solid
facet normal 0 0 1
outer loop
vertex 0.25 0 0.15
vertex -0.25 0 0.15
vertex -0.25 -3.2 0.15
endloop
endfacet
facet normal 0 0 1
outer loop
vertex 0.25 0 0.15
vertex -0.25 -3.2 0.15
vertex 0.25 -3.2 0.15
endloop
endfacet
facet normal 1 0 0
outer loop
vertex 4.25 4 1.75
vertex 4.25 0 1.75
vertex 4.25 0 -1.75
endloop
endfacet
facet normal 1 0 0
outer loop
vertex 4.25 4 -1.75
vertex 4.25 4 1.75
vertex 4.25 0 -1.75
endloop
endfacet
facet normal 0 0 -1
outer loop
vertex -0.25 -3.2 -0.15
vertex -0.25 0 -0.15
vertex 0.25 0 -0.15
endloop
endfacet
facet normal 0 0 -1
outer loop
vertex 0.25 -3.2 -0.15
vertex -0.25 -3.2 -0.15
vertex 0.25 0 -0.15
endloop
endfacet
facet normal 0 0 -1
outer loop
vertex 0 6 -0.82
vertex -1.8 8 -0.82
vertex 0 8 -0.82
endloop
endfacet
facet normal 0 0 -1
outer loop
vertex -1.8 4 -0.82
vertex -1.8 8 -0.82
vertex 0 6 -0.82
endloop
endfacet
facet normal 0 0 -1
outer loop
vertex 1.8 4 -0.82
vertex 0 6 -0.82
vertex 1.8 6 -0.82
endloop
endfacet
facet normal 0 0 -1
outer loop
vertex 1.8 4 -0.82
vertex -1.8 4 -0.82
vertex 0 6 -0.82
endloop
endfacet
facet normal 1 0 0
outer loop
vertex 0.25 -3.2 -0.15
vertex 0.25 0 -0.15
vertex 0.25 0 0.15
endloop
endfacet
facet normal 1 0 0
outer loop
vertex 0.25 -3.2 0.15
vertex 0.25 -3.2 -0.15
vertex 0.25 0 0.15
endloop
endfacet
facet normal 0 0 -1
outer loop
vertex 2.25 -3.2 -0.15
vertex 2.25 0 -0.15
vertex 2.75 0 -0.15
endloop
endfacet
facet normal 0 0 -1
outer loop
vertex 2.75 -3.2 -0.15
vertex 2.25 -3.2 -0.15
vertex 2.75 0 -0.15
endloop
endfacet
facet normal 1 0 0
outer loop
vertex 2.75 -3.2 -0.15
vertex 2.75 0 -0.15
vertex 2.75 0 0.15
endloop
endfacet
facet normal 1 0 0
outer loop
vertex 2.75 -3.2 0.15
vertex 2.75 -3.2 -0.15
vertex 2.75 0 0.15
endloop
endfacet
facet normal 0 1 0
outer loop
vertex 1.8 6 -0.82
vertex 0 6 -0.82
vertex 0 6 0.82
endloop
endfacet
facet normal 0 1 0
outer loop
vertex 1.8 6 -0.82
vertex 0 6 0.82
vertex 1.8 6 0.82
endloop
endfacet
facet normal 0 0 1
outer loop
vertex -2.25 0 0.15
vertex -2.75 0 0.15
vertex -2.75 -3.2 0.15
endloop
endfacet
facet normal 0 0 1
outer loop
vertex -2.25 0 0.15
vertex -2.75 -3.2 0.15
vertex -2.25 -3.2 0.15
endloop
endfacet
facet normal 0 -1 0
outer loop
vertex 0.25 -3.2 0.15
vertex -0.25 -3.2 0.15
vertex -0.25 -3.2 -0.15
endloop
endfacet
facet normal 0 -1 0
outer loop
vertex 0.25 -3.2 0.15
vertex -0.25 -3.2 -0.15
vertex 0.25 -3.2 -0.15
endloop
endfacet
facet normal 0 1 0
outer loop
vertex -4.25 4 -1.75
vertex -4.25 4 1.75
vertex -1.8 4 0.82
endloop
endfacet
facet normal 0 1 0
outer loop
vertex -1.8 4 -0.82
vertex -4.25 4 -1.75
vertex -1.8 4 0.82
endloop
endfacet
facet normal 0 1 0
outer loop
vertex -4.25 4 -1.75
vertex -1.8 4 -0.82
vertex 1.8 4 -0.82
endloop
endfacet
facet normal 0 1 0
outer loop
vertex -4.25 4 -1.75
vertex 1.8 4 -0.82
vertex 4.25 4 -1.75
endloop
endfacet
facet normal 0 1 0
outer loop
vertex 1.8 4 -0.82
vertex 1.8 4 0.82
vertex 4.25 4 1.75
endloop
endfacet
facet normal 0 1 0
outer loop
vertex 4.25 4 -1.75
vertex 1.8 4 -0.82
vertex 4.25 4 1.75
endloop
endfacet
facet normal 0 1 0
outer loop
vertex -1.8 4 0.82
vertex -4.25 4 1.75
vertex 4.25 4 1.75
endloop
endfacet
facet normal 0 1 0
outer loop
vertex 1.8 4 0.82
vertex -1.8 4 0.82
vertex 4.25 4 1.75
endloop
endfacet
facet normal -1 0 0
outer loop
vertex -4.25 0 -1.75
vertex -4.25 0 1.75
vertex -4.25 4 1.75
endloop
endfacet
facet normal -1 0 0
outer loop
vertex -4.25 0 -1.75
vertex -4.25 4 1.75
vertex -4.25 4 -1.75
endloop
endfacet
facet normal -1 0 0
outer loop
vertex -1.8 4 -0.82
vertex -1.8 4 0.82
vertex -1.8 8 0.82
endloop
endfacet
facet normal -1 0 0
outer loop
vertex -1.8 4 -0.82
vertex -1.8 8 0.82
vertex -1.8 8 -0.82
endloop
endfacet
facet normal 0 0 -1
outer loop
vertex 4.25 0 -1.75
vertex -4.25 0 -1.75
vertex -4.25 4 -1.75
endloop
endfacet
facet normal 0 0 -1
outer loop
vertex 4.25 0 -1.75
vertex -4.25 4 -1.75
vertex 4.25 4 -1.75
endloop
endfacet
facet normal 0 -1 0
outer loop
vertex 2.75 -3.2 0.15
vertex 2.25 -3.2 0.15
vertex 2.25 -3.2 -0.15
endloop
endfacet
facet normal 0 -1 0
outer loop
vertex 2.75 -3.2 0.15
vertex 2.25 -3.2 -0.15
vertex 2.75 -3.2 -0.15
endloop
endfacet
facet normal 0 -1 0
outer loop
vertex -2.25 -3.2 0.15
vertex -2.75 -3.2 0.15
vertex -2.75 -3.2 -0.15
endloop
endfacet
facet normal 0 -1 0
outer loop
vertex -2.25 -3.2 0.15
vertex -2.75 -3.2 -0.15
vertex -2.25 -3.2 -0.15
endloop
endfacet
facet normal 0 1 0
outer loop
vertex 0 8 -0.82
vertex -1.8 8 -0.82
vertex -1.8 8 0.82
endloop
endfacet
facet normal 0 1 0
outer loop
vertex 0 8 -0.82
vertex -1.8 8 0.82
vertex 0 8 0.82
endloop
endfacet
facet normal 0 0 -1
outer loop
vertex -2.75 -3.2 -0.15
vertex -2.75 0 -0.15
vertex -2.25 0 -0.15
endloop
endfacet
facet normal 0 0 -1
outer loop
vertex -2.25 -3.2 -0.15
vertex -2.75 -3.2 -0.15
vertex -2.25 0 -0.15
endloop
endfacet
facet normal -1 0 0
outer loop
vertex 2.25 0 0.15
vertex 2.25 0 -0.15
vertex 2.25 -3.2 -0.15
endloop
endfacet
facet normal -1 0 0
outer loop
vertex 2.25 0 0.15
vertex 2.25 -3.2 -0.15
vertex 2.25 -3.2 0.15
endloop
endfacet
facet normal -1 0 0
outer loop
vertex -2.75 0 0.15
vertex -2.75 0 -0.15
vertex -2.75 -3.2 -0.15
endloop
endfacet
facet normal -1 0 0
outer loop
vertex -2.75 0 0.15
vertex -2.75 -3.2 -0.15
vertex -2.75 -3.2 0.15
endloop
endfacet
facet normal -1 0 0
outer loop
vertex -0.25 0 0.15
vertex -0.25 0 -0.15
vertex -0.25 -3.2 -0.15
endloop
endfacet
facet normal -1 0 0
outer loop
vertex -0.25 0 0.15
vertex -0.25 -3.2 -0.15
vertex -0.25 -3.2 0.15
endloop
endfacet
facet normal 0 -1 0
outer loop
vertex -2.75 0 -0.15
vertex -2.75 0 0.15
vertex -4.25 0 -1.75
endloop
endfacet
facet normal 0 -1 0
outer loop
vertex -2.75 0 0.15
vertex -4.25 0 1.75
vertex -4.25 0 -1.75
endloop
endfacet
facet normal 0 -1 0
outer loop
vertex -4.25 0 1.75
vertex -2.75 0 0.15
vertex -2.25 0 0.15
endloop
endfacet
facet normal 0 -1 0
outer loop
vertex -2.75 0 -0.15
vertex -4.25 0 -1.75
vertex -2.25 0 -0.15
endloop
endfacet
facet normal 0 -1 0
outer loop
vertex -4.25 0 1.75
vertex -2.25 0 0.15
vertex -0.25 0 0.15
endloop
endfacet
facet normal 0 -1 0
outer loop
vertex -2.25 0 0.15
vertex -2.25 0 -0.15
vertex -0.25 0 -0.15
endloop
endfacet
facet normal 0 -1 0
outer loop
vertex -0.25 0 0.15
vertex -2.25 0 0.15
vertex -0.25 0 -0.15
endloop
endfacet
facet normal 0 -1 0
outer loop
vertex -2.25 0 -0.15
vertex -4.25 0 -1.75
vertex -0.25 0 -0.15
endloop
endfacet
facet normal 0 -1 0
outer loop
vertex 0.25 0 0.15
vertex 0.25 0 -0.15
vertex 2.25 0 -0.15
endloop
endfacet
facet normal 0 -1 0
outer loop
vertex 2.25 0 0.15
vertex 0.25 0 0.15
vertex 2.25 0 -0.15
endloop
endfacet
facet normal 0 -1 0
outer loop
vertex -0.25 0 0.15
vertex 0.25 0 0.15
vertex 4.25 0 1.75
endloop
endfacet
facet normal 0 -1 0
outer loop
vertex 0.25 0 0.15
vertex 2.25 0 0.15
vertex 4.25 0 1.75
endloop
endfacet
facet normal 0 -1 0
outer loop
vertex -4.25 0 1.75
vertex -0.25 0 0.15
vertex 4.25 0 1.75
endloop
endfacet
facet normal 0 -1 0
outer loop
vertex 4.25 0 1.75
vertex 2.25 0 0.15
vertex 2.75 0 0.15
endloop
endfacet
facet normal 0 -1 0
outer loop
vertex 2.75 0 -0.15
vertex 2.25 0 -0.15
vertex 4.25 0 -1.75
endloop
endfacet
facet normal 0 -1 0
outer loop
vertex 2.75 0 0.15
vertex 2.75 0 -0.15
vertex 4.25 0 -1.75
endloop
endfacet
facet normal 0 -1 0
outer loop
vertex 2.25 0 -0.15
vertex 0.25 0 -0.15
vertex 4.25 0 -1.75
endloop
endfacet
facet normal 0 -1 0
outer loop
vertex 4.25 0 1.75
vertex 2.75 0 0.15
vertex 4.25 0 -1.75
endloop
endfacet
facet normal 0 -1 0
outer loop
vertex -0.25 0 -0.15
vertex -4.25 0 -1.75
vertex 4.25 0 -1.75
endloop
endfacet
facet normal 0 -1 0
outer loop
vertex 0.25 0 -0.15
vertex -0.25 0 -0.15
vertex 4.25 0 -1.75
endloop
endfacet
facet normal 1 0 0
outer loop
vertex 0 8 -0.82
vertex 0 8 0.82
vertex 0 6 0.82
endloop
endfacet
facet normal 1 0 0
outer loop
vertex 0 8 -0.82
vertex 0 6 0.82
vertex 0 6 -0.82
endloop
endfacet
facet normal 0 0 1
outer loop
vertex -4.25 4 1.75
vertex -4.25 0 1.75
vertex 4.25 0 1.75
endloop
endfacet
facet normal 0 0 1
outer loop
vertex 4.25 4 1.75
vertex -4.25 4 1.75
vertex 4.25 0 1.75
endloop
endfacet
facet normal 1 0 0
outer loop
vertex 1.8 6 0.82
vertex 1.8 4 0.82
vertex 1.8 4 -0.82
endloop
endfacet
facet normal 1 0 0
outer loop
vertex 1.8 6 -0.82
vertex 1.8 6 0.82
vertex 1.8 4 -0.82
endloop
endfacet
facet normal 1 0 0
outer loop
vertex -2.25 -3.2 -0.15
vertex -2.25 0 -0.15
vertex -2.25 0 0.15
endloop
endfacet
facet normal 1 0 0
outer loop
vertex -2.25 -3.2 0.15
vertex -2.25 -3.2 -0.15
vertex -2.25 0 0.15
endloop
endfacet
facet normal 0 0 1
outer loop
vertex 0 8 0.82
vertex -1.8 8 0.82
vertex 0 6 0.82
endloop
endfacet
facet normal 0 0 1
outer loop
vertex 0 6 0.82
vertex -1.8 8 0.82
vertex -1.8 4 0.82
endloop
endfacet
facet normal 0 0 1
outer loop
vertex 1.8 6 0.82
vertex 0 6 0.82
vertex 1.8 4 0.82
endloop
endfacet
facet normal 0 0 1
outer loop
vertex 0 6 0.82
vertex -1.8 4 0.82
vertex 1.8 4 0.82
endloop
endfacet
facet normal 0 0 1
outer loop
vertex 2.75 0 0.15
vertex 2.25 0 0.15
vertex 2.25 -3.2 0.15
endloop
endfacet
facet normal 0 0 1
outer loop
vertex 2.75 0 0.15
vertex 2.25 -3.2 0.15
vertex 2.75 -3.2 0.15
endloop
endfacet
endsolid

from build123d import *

# Parameters (mm, degrees)
SKETCH_1_W          = 8.5
SKETCH_1_H          = 3.5
EXTRUDE_1_DEPTH     = 4
SKETCH_2_W          = 3.6
SKETCH_2_H          = 1.64
EXTRUDE_2_DEPTH     = 4
SKETCH_3_W          = 1.8
SKETCH_3_H          = 1.64
CUT_EXTRUDE_1_DEPTH = 2
EXTRUDE_START       = -4
SKETCH_4_W          = 0.5
SKETCH_4_H          = 0.3
EXTRUDE_3_DEPTH     = 7.2


with BuildPart() as part:
    # 草图1 → 凸台-拉伸1 (new body)
    with BuildSketch(Plane(origin=(0, 0, 0), x_dir=(1, 0, 0), z_dir=(0, 1, 0))):
        Rectangle(SKETCH_1_W, SKETCH_1_H)
    extrude(amount=EXTRUDE_1_DEPTH)

    # 草图2 → 凸台-拉伸2 (add)
    with BuildSketch(Plane(origin=(0, 4, 0), x_dir=(1, 0, 0), z_dir=(0, 1, 0))):
        Rectangle(SKETCH_2_W, SKETCH_2_H)
    extrude(amount=EXTRUDE_2_DEPTH)

    # 草图3 → 切除-拉伸1 (cut)
    with BuildSketch(Plane(origin=(0, 8, 0), x_dir=(1, 0, 0), z_dir=(0, 1, 0))):
        with Locations((0.9, 0)):
            Rectangle(SKETCH_3_W, SKETCH_3_H)
    extrude(amount=-CUT_EXTRUDE_1_DEPTH, mode=Mode.SUBTRACT)

    # 草图4 → 凸台-拉伸3 (add)
    with BuildSketch(Plane.XZ.offset(EXTRUDE_START)):
        with Locations((2.5, 0)):
            Rectangle(SKETCH_4_W, SKETCH_4_H)
        Rectangle(SKETCH_4_W, SKETCH_4_H)
        with Locations((-2.5, 0)):
            Rectangle(SKETCH_4_W, SKETCH_4_H)
    extrude(amount=EXTRUDE_3_DEPTH)


solid = part.part
